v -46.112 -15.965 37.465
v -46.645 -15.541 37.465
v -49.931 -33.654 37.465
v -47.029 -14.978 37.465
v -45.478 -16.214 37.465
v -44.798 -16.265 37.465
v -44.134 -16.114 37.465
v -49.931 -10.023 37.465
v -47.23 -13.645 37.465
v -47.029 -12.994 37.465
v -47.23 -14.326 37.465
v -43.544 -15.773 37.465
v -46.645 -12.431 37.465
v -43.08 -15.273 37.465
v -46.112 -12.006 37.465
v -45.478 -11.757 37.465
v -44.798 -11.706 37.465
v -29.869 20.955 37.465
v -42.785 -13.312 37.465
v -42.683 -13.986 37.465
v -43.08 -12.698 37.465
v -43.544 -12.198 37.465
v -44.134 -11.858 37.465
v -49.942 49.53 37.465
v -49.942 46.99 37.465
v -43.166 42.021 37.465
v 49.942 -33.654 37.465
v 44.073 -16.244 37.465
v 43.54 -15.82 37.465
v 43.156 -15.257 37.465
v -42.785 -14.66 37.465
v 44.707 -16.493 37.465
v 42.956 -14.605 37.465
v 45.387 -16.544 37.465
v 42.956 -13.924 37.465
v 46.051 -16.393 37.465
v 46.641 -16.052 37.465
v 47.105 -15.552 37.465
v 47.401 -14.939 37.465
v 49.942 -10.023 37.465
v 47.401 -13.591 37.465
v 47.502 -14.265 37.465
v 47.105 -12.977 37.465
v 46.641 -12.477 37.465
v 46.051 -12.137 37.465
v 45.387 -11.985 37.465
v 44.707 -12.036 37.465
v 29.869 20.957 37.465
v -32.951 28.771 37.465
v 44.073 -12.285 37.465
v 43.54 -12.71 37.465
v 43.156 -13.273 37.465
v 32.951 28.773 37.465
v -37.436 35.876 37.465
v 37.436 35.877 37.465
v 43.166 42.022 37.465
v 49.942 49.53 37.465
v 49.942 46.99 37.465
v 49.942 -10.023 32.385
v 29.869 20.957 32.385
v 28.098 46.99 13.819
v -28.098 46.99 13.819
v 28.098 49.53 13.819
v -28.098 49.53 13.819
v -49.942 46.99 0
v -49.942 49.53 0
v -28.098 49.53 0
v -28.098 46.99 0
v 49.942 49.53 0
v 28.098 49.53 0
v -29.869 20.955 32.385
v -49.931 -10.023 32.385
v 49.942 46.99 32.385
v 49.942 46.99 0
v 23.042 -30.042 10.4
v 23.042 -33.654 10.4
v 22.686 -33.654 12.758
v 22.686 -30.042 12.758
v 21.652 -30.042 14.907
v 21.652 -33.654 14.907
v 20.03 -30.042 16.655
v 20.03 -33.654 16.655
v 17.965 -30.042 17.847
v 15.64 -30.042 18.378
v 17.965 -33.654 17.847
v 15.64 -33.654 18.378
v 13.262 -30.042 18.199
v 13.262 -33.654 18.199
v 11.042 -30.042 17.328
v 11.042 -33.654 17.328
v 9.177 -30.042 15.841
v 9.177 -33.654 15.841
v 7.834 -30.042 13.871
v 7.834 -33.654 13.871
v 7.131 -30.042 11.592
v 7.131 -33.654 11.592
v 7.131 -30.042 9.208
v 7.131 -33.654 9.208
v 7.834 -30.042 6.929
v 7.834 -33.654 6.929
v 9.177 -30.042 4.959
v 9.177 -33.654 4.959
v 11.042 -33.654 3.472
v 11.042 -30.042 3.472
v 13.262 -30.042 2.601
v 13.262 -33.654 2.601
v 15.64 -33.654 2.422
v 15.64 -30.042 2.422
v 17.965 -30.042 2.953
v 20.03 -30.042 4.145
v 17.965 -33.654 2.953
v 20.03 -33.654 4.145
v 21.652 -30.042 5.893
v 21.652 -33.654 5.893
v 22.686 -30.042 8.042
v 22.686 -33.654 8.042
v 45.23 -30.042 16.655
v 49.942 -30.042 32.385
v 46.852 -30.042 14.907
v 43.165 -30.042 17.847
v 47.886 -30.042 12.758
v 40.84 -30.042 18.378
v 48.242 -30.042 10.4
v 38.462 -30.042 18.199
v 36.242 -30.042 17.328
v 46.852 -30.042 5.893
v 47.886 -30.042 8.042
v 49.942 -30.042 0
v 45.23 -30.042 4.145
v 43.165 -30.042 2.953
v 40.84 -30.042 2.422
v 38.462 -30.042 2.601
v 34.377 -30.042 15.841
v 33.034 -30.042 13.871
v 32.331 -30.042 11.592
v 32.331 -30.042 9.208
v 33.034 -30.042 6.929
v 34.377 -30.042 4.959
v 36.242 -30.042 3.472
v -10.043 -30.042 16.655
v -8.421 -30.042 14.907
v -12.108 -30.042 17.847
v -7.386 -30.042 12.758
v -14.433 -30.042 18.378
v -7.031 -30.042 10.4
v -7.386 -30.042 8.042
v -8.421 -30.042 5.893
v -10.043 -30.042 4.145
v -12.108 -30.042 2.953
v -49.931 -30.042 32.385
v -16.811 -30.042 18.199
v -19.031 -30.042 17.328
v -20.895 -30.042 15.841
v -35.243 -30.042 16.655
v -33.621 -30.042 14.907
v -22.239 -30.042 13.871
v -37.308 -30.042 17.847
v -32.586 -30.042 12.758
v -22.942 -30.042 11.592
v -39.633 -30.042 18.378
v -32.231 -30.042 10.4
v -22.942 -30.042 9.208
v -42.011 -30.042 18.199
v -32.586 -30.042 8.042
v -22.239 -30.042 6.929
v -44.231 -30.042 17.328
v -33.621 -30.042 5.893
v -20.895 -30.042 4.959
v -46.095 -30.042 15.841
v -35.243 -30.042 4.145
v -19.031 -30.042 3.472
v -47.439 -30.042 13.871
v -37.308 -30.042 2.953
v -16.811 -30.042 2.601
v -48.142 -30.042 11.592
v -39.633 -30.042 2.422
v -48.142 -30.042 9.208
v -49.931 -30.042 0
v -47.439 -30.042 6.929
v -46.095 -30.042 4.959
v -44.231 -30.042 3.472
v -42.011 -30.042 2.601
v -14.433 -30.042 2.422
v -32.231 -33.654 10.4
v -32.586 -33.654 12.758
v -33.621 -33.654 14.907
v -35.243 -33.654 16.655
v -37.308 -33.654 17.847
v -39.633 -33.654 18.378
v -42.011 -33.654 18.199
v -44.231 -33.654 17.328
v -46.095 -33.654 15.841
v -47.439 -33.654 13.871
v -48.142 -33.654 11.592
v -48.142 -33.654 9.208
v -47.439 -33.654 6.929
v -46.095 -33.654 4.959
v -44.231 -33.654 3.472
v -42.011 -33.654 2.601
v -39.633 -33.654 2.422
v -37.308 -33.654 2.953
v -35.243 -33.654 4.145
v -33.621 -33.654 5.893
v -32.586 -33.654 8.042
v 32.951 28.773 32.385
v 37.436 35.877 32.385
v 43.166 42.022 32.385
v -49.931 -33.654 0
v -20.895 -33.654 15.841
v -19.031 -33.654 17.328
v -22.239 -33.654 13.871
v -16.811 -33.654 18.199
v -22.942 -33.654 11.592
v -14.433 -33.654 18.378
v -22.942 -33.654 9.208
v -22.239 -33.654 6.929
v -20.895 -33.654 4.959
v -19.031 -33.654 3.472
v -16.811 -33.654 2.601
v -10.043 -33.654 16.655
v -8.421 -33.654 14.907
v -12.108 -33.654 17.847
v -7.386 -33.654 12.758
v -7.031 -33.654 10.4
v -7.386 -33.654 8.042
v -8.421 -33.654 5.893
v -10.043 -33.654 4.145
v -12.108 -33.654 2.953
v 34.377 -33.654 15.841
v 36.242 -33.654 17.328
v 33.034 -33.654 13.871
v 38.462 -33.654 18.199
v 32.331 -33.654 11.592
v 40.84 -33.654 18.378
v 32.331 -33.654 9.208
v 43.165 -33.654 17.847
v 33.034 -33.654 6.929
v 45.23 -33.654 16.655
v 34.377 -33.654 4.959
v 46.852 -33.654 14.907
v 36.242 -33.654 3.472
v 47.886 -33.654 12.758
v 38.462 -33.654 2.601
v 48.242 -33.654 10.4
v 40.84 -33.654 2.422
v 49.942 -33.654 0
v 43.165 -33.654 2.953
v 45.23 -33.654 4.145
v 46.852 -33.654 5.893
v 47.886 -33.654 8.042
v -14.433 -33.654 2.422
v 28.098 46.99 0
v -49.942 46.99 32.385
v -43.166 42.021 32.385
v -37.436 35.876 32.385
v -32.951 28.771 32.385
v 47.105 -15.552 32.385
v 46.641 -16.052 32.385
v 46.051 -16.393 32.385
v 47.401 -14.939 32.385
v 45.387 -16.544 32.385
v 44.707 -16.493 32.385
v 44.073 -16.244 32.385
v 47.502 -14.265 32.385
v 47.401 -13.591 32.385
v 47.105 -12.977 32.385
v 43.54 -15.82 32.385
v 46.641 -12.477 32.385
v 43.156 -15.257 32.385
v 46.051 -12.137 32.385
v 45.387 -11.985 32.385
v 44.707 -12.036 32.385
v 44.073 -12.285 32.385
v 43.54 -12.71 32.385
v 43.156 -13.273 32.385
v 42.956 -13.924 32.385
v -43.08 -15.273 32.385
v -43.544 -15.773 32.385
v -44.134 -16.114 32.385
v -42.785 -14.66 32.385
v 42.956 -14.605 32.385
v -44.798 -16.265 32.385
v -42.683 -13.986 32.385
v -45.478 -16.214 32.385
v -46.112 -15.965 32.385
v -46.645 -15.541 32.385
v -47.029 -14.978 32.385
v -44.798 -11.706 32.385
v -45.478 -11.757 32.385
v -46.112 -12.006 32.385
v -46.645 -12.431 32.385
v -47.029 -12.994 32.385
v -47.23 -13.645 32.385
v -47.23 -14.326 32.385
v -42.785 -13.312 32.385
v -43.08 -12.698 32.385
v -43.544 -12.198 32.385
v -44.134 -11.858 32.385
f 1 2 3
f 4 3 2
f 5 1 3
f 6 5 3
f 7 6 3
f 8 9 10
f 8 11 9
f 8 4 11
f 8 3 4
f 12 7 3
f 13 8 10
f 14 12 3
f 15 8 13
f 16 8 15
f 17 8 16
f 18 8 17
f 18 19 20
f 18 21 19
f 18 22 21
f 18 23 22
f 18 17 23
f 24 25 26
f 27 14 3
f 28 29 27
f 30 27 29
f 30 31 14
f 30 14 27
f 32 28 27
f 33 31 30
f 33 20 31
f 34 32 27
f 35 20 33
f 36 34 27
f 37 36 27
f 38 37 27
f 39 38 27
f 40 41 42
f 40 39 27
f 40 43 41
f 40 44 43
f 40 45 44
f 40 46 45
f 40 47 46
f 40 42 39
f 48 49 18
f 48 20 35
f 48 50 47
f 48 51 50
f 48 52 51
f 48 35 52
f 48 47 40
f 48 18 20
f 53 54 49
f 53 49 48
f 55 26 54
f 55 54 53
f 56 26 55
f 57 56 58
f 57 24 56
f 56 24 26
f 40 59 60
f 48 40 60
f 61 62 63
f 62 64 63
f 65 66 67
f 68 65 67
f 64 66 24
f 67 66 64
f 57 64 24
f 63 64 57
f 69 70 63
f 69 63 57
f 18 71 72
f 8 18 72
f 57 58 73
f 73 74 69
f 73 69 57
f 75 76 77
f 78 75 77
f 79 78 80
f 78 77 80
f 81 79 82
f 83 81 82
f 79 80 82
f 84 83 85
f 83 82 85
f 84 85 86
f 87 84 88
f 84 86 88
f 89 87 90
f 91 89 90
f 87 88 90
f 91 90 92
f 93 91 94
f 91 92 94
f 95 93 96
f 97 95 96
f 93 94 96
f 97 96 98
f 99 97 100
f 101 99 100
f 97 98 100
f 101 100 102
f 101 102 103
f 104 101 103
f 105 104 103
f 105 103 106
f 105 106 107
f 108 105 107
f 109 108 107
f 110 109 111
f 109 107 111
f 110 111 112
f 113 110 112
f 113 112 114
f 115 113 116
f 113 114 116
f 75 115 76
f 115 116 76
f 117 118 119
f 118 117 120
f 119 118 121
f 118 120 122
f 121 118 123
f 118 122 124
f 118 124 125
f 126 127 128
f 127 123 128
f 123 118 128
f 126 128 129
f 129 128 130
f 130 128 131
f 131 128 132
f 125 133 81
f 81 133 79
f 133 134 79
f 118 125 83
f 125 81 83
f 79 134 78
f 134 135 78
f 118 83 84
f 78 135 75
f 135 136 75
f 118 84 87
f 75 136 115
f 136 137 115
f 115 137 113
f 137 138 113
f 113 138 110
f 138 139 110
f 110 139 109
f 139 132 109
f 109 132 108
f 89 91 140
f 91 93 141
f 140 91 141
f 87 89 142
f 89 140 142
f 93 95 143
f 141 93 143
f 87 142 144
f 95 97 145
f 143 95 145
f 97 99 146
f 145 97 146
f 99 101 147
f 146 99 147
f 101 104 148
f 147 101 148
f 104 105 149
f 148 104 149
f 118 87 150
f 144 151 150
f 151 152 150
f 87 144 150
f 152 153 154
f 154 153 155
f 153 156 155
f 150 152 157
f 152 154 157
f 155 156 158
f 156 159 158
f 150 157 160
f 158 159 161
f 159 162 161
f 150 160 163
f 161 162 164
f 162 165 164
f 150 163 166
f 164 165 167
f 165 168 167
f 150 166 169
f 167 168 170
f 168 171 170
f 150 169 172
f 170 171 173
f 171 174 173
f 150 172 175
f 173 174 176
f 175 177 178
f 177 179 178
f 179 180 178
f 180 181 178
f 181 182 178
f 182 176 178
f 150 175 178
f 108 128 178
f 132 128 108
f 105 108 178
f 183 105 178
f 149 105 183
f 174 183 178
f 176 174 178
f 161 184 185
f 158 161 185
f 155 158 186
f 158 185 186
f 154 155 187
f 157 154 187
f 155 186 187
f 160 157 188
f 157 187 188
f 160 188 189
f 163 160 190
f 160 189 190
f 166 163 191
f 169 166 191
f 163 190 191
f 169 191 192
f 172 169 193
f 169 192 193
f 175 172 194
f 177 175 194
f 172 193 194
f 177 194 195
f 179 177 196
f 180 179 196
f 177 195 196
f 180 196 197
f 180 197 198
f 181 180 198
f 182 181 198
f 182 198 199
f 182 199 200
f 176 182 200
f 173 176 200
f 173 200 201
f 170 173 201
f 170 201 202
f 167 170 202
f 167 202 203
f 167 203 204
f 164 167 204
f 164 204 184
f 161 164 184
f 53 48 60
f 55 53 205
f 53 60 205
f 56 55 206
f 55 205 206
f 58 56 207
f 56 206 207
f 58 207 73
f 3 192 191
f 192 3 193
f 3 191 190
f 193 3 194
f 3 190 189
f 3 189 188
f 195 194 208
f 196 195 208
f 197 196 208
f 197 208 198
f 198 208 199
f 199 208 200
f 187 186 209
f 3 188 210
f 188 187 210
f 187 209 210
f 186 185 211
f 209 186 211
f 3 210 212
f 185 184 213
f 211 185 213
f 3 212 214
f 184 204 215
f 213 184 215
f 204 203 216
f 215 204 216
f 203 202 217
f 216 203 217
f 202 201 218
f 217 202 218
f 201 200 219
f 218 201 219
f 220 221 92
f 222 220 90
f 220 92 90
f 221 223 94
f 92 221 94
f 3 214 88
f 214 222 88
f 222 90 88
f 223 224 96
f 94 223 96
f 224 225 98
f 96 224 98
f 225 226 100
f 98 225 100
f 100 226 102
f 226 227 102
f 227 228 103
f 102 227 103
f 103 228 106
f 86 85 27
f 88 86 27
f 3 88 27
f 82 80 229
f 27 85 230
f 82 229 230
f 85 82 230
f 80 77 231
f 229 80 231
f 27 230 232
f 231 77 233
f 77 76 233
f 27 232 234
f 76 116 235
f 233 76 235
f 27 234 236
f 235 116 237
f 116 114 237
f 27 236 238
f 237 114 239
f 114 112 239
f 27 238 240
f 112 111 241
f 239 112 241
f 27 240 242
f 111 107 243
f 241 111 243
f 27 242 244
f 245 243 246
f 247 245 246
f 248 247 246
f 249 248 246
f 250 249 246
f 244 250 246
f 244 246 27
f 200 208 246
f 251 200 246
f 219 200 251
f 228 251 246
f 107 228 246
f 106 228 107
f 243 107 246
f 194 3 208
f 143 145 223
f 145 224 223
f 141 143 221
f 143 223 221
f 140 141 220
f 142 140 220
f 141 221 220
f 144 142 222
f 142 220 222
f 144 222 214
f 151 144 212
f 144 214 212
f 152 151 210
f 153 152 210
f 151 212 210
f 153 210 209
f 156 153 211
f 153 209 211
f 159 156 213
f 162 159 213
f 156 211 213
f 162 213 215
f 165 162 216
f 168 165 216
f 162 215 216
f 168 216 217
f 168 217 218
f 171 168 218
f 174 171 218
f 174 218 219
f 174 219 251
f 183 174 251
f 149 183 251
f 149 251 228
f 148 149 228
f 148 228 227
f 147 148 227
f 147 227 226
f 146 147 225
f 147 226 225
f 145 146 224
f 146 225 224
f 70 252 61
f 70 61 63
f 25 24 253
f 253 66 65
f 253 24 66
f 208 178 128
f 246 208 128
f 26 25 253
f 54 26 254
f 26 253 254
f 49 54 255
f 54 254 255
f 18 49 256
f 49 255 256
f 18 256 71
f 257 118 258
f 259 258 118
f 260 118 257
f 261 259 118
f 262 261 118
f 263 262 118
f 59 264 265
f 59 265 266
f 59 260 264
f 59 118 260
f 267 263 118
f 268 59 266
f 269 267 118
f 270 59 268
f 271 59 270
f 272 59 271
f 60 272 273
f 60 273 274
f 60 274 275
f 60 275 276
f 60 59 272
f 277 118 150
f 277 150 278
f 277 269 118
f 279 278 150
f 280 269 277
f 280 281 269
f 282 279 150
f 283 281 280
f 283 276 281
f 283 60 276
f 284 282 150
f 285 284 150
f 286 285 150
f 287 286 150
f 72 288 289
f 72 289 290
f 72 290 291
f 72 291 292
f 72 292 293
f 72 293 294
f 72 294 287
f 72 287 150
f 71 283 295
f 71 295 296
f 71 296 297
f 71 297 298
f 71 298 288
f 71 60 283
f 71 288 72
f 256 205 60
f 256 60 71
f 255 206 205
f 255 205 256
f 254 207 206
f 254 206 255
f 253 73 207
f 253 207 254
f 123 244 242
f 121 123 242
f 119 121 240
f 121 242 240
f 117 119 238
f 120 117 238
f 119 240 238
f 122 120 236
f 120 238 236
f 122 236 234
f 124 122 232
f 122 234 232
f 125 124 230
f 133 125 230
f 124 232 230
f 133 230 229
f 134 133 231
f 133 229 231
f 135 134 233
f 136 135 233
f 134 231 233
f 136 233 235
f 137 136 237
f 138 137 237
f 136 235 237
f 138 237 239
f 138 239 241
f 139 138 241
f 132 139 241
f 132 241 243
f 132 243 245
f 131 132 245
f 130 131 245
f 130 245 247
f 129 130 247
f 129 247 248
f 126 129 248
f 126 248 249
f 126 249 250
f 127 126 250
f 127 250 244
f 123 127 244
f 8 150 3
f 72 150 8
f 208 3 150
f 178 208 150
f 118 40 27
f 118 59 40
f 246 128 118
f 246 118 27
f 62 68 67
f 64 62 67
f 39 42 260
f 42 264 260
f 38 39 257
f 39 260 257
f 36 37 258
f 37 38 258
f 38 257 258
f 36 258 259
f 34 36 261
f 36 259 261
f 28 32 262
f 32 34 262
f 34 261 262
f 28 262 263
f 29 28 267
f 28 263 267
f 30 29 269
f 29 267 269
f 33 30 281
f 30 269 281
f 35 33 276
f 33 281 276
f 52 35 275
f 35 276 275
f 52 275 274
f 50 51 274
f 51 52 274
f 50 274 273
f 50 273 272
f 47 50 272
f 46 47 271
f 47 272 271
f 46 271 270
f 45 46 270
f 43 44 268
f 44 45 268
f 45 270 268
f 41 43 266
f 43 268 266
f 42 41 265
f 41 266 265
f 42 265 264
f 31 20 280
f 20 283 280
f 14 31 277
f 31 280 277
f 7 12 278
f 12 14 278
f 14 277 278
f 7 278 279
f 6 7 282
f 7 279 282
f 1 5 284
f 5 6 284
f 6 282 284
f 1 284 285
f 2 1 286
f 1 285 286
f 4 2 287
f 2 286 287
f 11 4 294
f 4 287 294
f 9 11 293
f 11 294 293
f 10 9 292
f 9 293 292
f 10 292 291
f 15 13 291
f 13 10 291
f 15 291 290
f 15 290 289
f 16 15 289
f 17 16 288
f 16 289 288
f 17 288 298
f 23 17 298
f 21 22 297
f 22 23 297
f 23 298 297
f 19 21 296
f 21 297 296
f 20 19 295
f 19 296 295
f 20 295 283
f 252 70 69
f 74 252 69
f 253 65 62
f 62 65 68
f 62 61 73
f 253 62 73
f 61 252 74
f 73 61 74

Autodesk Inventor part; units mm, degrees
ref_plane "YZ Plane" through (0, 0, 0) normal (1, 0, 0) x (0, 1, 0)
ref_plane "XZ Plane" through (0, 0, 0) normal (0, 1, 0) x (-1, 0, 0)
ref_plane "XY Plane" through (0, 0, 0) normal (0, 0, 1) x (1, 0, 0)
sketch "Sketch1" plane through (0, 0, 0) normal (0, 0, 1) x (1, 0, 0)
  line L0 (-28.0978, -20.8895) -> (-28.0978, -10.0232) projected
  line L1 (-49.931, -10.0232) -> (-28.0978, -10.0232) projected
  line L2 (-49.931, -33.6545) -> (-49.931, -10.0232) projected
  line L3 (49.9418, -33.6545) -> (-49.931, -33.6545) projected
  line L4 (49.9418, -10.0232) -> (49.9418, -33.6545) projected
  line L5 (28.0978, -10.0232) -> (49.9418, -10.0232) projected
  line L6 (28.0978, -10.0232) -> (28.0978, 46.99) projected
  line L7 (25.2422, 49.53) -> (25.2422, -14.986) projected
  line L8 (25.2422, -14.986) -> (28.0978, -14.986) projected
  line L9 (28.0978, -14.986) -> (28.0978, -20.8895) projected
  line L10 (28.0978, -20.8895) -> (-28.0978, -20.8895) projected
  line L11 (-28.0978, -16.51) -> (-28.0978, 49.53) projected
  line L12 (-28.0978, 49.53) -> (25.2422, 49.53) projected
  line L13 (49.9418, -33.6545) -> (-49.931, -33.6545)
  line L14 (-49.931, -33.6545) -> (-49.931, -30.0416)
  line L15 (-49.931, -30.0416) -> (49.9418, -30.0416)
  line L16 (49.9418, -30.0416) -> (49.9418, -33.6545)
  line L17 (49.9418, 46.99) -> (49.9418, 49.53) projected
  line L18 (28.0978, 49.53) -> (49.9418, 49.53) projected
  line L19 (28.0978, 46.99) -> (28.0978, 49.53) projected
  line L20 (28.0978, 46.99) -> (49.9418, 46.99) projected
  line L21 (-49.9418, 49.53) -> (-49.9418, 46.99) projected
  line L22 (-49.9418, 46.99) -> (-28.0978, 46.99) projected
  line L23 (-28.0978, 46.99) -> (-28.0978, 49.53) projected
  line L24 (-49.9418, 49.53) -> (-28.0978, 49.53) projected
  line L25 (49.9418, 46.99) -> (28.0978, 46.99)
  line L26 (28.0978, 46.99) -> (28.0978, 49.53)
  line L27 (28.0978, 49.53) -> (49.9418, 49.53)
  line L28 (49.9418, 49.53) -> (49.9418, 46.99)
  line L29 (-28.0978, 46.99) -> (-49.9418, 46.99)
  line L30 (-49.9418, 46.99) -> (-49.9418, 49.53)
  line L31 (-49.9418, 49.53) -> (-28.0978, 49.53)
  line L32 (-28.0978, 49.53) -> (-28.0978, 46.99)
  line L33 (28.0978, 46.99) -> (49.9418, 46.99) projected
  line L34 (49.9418, 46.99) -> (49.9418, 49.53) projected
  line L35 (49.9418, 49.53) -> (25.2422, 49.53) projected
  circle A0 centre (-44.9691, -13.9857) radius 2.286 projected
  circle A1 centre (45.2161, -14.2647) radius 2.286 projected
  point P0 (0, 0)
extrude "Extrusion1" add sketch "Sketch1" along normal blind 25.4 contours L22 L21 L24 L11 | L15 L4 L3 L2 | L18 L17 L20 L19
sketch "Sketch2" plane through (-49.931, -33.6545, 0) normal (0, -1, 0) x (1, 0, 0)
  circle A0 centre (9.7, 10.4) radius 8 projected
  circle A1 centre (34.9, 10.4) radius 8 projected
  circle A2 centre (64.9728, 10.4) radius 8 projected
  circle A3 centre (90.1728, 10.4) radius 8 projected
  circle A4 centre (9.7, 10.4) radius 8.128
  circle A5 centre (34.9, 10.4) radius 8.128
  circle A6 centre (64.9728, 10.4) radius 8.128
  circle A7 centre (90.1728, 10.4) radius 8.128
  point P0 (49.931, 0)
  dimension "d2" = 16.256
  dimension "d3" = 16.256
  dimension "d4" = 16.256
  dimension "d5" = 16.256
extrude "Extrusion2" cut sketch "Sketch2" against normal blind 25.4 contours A0 | A1 | A2 | A3
sketch "Sketch3" plane through (0, 0, 25.4) normal (0, 0, 1) x (1, 0, 0)
  line L0 (-49.931, -33.6545) -> (49.9418, -33.6545) projected
  line L1 (49.9418, -33.6545) -> (-49.931, -33.6545)
  line L2 (-28.0978, -20.8895) -> (-28.0978, -10.0232) projected
  line L3 (-49.931, -10.0232) -> (-28.0978, -10.0232) projected
  line L4 (-49.931, -33.6545) -> (-49.931, -10.0232) projected
  line L5 (49.9418, -33.6545) -> (-49.931, -33.6545) projected
  line L6 (49.9418, -10.0232) -> (49.9418, -33.6545) projected
  line L7 (28.0978, -10.0232) -> (49.9418, -10.0232) projected
  line L8 (28.0978, -10.0232) -> (28.0978, 46.99) projected
  line L9 (28.0978, 46.99) -> (49.9418, 46.99) projected
  line L10 (49.9418, 46.99) -> (49.9418, 49.53) projected
  line L11 (49.9418, 49.53) -> (25.2422, 49.53) projected
  line L12 (25.2422, 49.53) -> (25.2422, -14.986) projected
  line L13 (25.2422, -14.986) -> (28.0978, -14.986) projected
  line L14 (28.0978, -14.986) -> (28.0978, -20.8895) projected
  line L15 (28.0978, -20.8895) -> (-28.0978, -20.8895) projected
  line L16 (-28.0978, -16.51) -> (-28.0978, 49.53) projected
  line L17 (-28.0978, 49.53) -> (25.2422, 49.53) projected
  line L18 (-28.0978, 46.99) -> (-28.0978, 49.53) projected
  line L19 (-28.0978, 49.53) -> (-49.9418, 49.53) projected
  line L20 (-49.9418, 49.53) -> (-49.9418, 46.99) projected
  line L21 (-49.9418, 46.99) -> (-28.0978, 46.99) projected
  line L22 (-49.9418, 49.53) -> (-49.9418, 46.99) projected
  line L23 (-49.9418, 46.99) -> (-49.9418, 49.53)
  line L24 (-49.9418, 49.53) -> (49.9418, 49.53)
  line L25 (49.9418, 49.53) -> (49.9418, 46.99)
  line L26 (49.9418, -30.0416) -> (-49.931, -30.0416) projected
  line L27 (-49.931, -33.6545) -> (-49.931, -30.0416)
  line L28 (49.9418, -33.6545) -> (49.9418, -30.0416)
  line L29 (49.9418, -30.0416) -> (-49.931, -30.0416) projected
  arc A0 (-49.931, -30.0416) -> (-49.9418, 46.99) centre (-72.9814, 8.471) ccw
  arc A1 (49.9418, 46.99) -> (49.9418, -30.0416) centre (72.9757, 8.4742) ccw
  point P0 (0, 0)
extrude "Extrusion3" add sketch "Sketch3" along normal blind 2.54
sketch "Sketch4" plane through (0, 0, 27.94) normal (0, 0, 1) x (1, 0, 0)
  line L0 (49.9418, -33.6545) -> (49.9418, -10.0232) projected
  line L1 (49.9418, -10.0232) -> (32.0871, -10.0232) projected
  arc A0 (49.9418, 46.99) -> (32.0871, -10.0232) centre (72.9757, 8.4742) ccw projected
  line L2 (49.9418, 46.99) -> (49.9418, 49.53) projected
  line L3 (49.9418, 49.53) -> (-49.9418, 49.53) projected
  line L4 (-49.9418, 49.53) -> (-49.9418, 46.99) projected
  arc A1 (-32.0851, -10.0232) -> (-49.9418, 46.99) centre (-72.9814, 8.471) ccw projected
  line L5 (-32.0851, -10.0232) -> (-49.931, -10.0232) projected
  line L6 (-49.931, -10.0232) -> (-49.931, -33.6545) projected
  line L7 (-49.931, -33.6545) -> (49.9418, -33.6545) projected
  line L8 (-46.121, -28.5371) -> (-46.121, -11.9877) projected
  line L9 (46.1318, -11.9877) -> (46.1318, -28.5371) projected
  line L10 (-28.0978, -16.51) -> (-28.0978, 49.53) projected
  line L11 (28.0978, -10.0232) -> (28.0978, 46.99) projected
  line L12 (-46.121, -28.5371) -> (46.1318, -28.5371)
  line L13 (46.1318, -28.5371) -> (46.1318, -11.9877)
  line L14 (46.1318, -11.9877) -> (-46.121, -11.9877)
  line L15 (-46.121, -11.9877) -> (-46.121, -28.5371)
  line L16 (-28.0978, -11.9877) -> (28.0978, -11.9877)
  line L17 (28.0978, -11.9877) -> (28.0978, -6.5147)
  line L18 (28.0978, -6.5147) -> (-28.0978, -6.5147)
  line L19 (-28.0978, -6.5147) -> (-28.0978, -11.9877)
  line L20 (-28.0978, 23.6896) -> (28.0978, 23.6896)
  line L21 (28.0978, 23.6896) -> (28.0978, 29.0198)
  line L22 (28.0978, 29.0198) -> (-28.0978, 29.0198)
  line L23 (-28.0978, 29.0198) -> (-28.0978, 23.6896)
  line L24 (-28.0978, 32.3759) -> (28.0978, 32.3759)
  line L25 (28.0978, 32.3759) -> (28.0978, 44.8129)
  line L26 (28.0978, 44.8129) -> (-28.0978, 44.8129)
  line L27 (-28.0978, 44.8129) -> (-28.0978, 32.3759)
  point P0 (0, 0)
extrude "Extrusion4" cut sketch "Sketch4" against normal blind 2.54 contours L11 L17 L14 L10 L18 | L20 L10 L22 L11 | L14 L9 L12 L8 | L24 L10 L26 L11
sketch "Sketch5" plane through (28.0978, 49.53, 0) normal (0, 1, 0) x (1, 0, 0)
  line L0 (0, -25.4) -> (21.844, -25.4) projected
  line L1 (-56.1955, 0) -> (-56.1955, -25.4) projected
  line L2 (0, -25.4) -> (-56.1955, -25.4)
  line L3 (-56.1955, -25.4) -> (-56.1955, -13.819)
  line L4 (-56.1955, -13.819) -> (0, -13.819)
  line L5 (0, -13.819) -> (0, -25.4)
  point P0 (-28.0978, 0)
extrude "Extrusion5" add sketch "Sketch5" against normal blind 2.54
sketch "Sketch6" plane through (0, 0, 27.94) normal (0, 0, 1) x (1, 0, 0)
  line L0 (46.1318, -28.5371) -> (-46.121, -28.5371) projected
  line L1 (-46.121, -11.9877) -> (-46.121, -28.5371) projected
  line L2 (28.0978, -10.0232) -> (49.9418, -10.0232) projected
  line L3 (28.0978, -11.9877) -> (46.1318, -11.9877) projected
  line L4 (28.0978, -6.5147) -> (28.0978, -11.9877) projected
  line L5 (46.1318, -28.5371) -> (46.1318, -11.9877) projected
  line L6 (46.1318, -28.5371) -> (46.1318, -11.9877) construction
  line L7 (46.1318, -11.9877) -> (28.0978, -11.9877) projected
  line L8 (46.1318, -11.9877) -> (28.0978, -11.9877) construction
  spline S0 degree 2 poles (46.1318, -28.5371) (46.1318, -11.9877) (28.0978, -11.9877) knots 1 1 1 2 2 2
  line L9 (-46.121, -28.5371) -> (-46.121, -11.9877)
  line L10 (-28.0978, -11.9877) -> (-46.121, -11.9877) projected
  line L11 (-46.121, -11.9877) -> (-28.0978, -11.9877)
  line L12 (46.1318, -28.5371) -> (46.1318, -11.9877)
  line L13 (46.1318, -11.9877) -> (28.0978, -11.9877)
  line L14 (-46.121, -11.9877) -> (-28.0978, -11.9877) projected
  line L15 (-28.0978, -11.9877) -> (-46.121, -11.9877)
  line L16 (-46.121, -11.9877) -> (-46.121, -28.5371)
  line L17 (-46.121, -28.5371) -> (-46.121, -11.9877) construction
  line L18 (-32.231, -33.6545) -> (-48.231, -33.6545) projected
  line L19 (-46.121, -11.9877) -> (-28.0978, -11.9877) construction
  spline S1 degree 2 poles (-46.121, -28.5371) (-46.121, -11.9877) (-28.0978, -11.9877) knots 1 1 1 2 2 2
  point P0 (0, 0)
extrude "Extrusion6" add sketch "Sketch6" against normal blind 2.54
sketch "Sketch7" plane through (0, 0, 27.94) normal (0, 0, 1) x (1, 0, 0)
  line L0 (-28.0978, -11.9877) -> (-28.0978, -6.5147) projected
  line L1 (-28.0978, -11.9877) -> (0, -6.5147)
  line L2 (0, -6.5147) -> (28.0978, -11.9877)
  line L3 (28.0978, -11.9877) -> (28.0978, -6.5147)
  line L4 (-28.0978, -6.5147) -> (28.0978, -6.5147) projected
  line L5 (28.0978, -6.5147) -> (-28.0978, -6.5147)
  line L6 (-28.0978, -6.5147) -> (-28.0978, -11.9877)
  line L7 (0, -6.5147) -> (28.0978, -11.9877)
  line L8 (-28.0978, -11.9877) -> (-46.121, -11.9877) projected
  line L9 (-28.0978, -11.9877) -> (0, -6.5147)
  line L10 (-28.0978, -11.9877) -> (0, -6.5147)
  line L11 (0, -6.5147) -> (-28.0978, -6.5147)
  line L12 (-28.0978, -6.5147) -> (-28.0978, -11.9877)
  line L13 (0, -6.5147) -> (28.0978, -6.5147)
  line L14 (28.0978, -6.5147) -> (28.0978, -11.9877)
  line L15 (28.0978, -11.9877) -> (0, -6.5147)
  point P0 (0, 0)
extrude "Extrusion7" add sketch "Sketch7" against normal blind 2.54
sketch "Sketch8" plane through (0, 0, 27.94) normal (0, 0, 1) x (1, 0, 0)
  line L0 (-32.0851, -10.0232) -> (-49.931, -10.0232) projected
  line L1 (28.0978, 23.6896) -> (-28.0978, 23.6896) projected
  line L2 (-49.931, -10.0232) -> (-28.0978, 23.6896)
  line L3 (-28.0978, 23.6896) -> (28.0978, 23.6896)
  line L4 (49.9418, -10.0232) -> (32.0871, -10.0232) projected
  line L5 (28.0978, 23.6896) -> (49.9418, -10.0232)
  line L6 (49.9418, -10.0232) -> (32.0871, -10.0232)
  line L7 (0, -6.5147) -> (-28.0978, -11.9877) projected
  line L8 (32.0871, -10.0232) -> (0, -6.5147)
  line L9 (28.0978, 44.8129) -> (28.0978, 32.3759) projected
  line L10 (28.0978, 32.3759) -> (-28.0978, 32.3759) projected
  line L11 (-28.0978, 32.3759) -> (-28.0978, 44.8129) projected
  line L12 (-28.0978, 44.8129) -> (28.0978, 44.8129) projected
  line L13 (28.0978, 29.0198) -> (28.0978, 23.6896) projected
  line L14 (28.0978, 23.6896) -> (-28.0978, 23.6896) projected
  line L15 (-28.0978, 23.6896) -> (-28.0978, 29.0198) projected
  line L16 (-28.0978, 29.0198) -> (28.0978, 29.0198) projected
  line L17 (46.1318, -28.5371) -> (-46.121, -28.5371) projected
  line L18 (-28.0978, -11.9877) -> (0, -6.5147) projected
  line L19 (0, -6.5147) -> (28.0978, -11.9877) projected
  line L20 (49.9418, -33.6545) -> (49.9418, -10.0232) projected
  line L21 (49.9418, -10.0232) -> (32.0871, -10.0232) projected
  arc A0 (49.9418, 46.99) -> (32.0871, -10.0232) centre (72.9757, 8.4742) ccw projected
  line L22 (49.9418, 46.99) -> (49.9418, 49.53) projected
  line L23 (49.9418, 49.53) -> (-49.9418, 49.53) projected
  line L24 (-49.9418, 49.53) -> (-49.9418, 46.99) projected
  arc A1 (-32.0851, -10.0232) -> (-49.9418, 46.99) centre (-72.9814, 8.471) ccw projected
  line L25 (-32.0851, -10.0232) -> (-49.931, -10.0232) projected
  line L26 (-49.931, -10.0232) -> (-49.931, -33.6545) projected
  line L27 (-49.931, -33.6545) -> (49.9418, -33.6545) projected
  line L28 (0, -6.5147) -> (-32.0851, -10.0232)
  line L29 (-49.931, -10.0232) -> (-32.0851, -10.0232)
  line L30 (-49.931, -10.0232) -> (-28.0978, 23.6896)
  line L31 (-28.0978, 29.0198) -> (-28.0978, 23.6896) projected
  line L32 (-28.0978, 23.6896) -> (28.0978, 23.6896)
  line L33 (28.0978, 23.6896) -> (49.9418, -10.0232)
  line L34 (49.9418, -30.0416) -> (49.9418, -10.0232) projected
  line L35 (49.9418, -10.0232) -> (32.0871, -10.0232)
  line L36 (32.0871, -10.0232) -> (0, -6.5147)
  line L37 (-32.0851, -10.0232) -> (-49.931, -10.0232)
  point P0 (0, 0)
extrude "Extrusion8" add sketch "Sketch8" against normal blind 2.54 contours L0 L2 A1 | A1 L2 L1 L5 A0 L8 L28 | A0 L5 L4
sketch "Sketch9" plane through (0, 0, 27.94) normal (0, 0, 1) x (1, 0, 0)
  line L0 (0, -6.5147) -> (-28.0978, -11.9877) projected
  line L1 (0, -6.5147) -> (28.0978, -11.9877) projected
  line L2 (-28.0978, -11.9877) -> (28.0978, -11.9877)
  line L3 (28.0978, -11.9877) -> (8.8321, -8.235)
  line L4 (28.0978, -11.9877) -> (0, -6.5147)
  line L5 (-28.0978, -11.9877) -> (0, -6.5147)
  point P0 (0, 0)
extrude "Extrusion9" add sketch "Sketch9" against normal blind 2.54
sketch "Sketch10" plane through (0, 0, 27.94) normal (0, 0, 1) x (1, 0, 0)
  line L0 (28.0978, -11.9877) -> (-28.0978, -11.9877) construction
  line L1 (-46.121, -28.5371) -> (-28.0978, -11.9877) construction
  line L2 (-49.931, -10.0232) -> (-49.931, -30.0416) construction
  line L3 (-28.0978, -11.9877) -> (-49.931, -10.0232) construction
  line L4 (-49.931, -10.0232) -> (-37.1094, -20.2624) construction
  line L5 (46.1318, -28.5371) -> (30.9358, -11.9877) construction
  line L6 (29.8686, 20.9566) -> (49.9418, -10.0232) construction
  line L7 (30.9358, -11.9877) -> (49.9418, -10.0232) construction
  line L8 (-29.8688, 20.9549) -> (-49.931, -10.0232) construction
  line L9 (-49.931, -10.0232) -> (-44.9691, -13.9857) construction
  line L10 (-49.931, -10.0232) -> (-43.581, -10.0232) construction
  line L11 (49.9418, -10.0232) -> (38.5338, -20.2624) construction
  line L12 (49.9418, -10.0232) -> (45.2161, -14.2647) construction
  line L13 (49.9418, -10.0232) -> (56.2918, -10.0232) construction
  circle A0 centre (-44.9691, -13.9857) radius 2.286
  circle A1 centre (45.2161, -14.2647) radius 2.286
  point P0 (0, 0)
  dimension "d22" = 6.35
  dimension "d23" = 38.61
  dimension "d24" = 6.35
  dimension "d25" = 138.09
  dimension "d26" = 4.572
  dimension "d27" = 4.572
extrude "Extrusion10" cut sketch "Sketch10" against normal blind 2.54
sketch "Sketch11" plane through (0, 0, 27.94) normal (0, 0, 1) x (1, 0, 0)
  circle A0 centre (-44.9691, -13.9857) radius 2.286 projected
  circle A1 centre (45.2161, -14.2647) radius 2.286 projected
  line L0 (46.1318, -28.5371) -> (-46.121, -28.5371) projected
  line L1 (-28.0978, -11.9877) -> (28.0978, -11.9877) projected
  line L2 (28.0978, 44.8129) -> (28.0978, 32.3759) projected
  line L3 (28.0978, 32.3759) -> (-28.0978, 32.3759) projected
  line L4 (-28.0978, 32.3759) -> (-28.0978, 44.8129) projected
  line L5 (-28.0978, 44.8129) -> (28.0978, 44.8129) projected
  line L6 (28.0978, 23.6896) -> (-28.0978, 23.6896) projected
  line L7 (-28.0978, 23.6896) -> (-28.0978, 29.0198) projected
  line L8 (-28.0978, 29.0198) -> (28.0978, 29.0198) projected
  line L9 (28.0978, 29.0198) -> (28.0978, 23.6896) projected
  arc A2 (49.9418, 46.99) -> (29.8686, 20.9566) centre (72.9757, 8.4742) ccw projected
  line L10 (49.9418, 46.99) -> (49.9418, 49.53) projected
  line L11 (49.9418, 49.53) -> (-49.9418, 49.53) projected
  line L12 (-49.9418, 49.53) -> (-49.9418, 46.99) projected
  arc A3 (-29.8688, 20.9549) -> (-49.9418, 46.99) centre (-72.9814, 8.471) ccw projected
  line L13 (-29.8688, 20.9549) -> (-49.931, -10.0232) projected
  line L14 (-49.931, -10.0232) -> (-49.931, -33.6545) projected
  line L15 (-49.931, -33.6545) -> (49.9418, -33.6545) projected
  line L16 (49.9418, -33.6545) -> (49.9418, -10.0232) projected
  line L17 (49.9418, -10.0232) -> (29.8686, 20.9566) projected
  line L18 (49.9418, -33.6545) -> (-49.931, -33.6545)
  line L19 (-49.931, -10.0232) -> (-49.931, -30.0416) projected
  line L20 (-49.931, -10.0232) -> (-29.8688, 20.9549)
  arc A4 (-29.8688, 20.9549) -> (-49.9418, 46.99) centre (-72.9814, 8.471) ccw
  line L21 (-49.9418, 46.99) -> (49.9418, 46.99) projected
  line L22 (-49.9418, 46.99) -> (-49.9418, 49.53)
  line L23 (49.9418, 49.53) -> (28.0978, 49.53) projected
  line L24 (-49.9418, 49.53) -> (49.9418, 49.53)
  line L25 (49.9418, 49.53) -> (49.9418, 46.99)
  line L26 (49.9418, -10.0232) -> (29.8686, 20.9566) projected
  arc A5 (49.9418, 46.99) -> (29.8686, 20.9566) centre (72.9757, 8.4742) ccw
  line L27 (29.8686, 20.9566) -> (49.9418, -10.0232)
  point P0 (0, 0)
extrude "Extrusion11" add sketch "Sketch11" along normal blind 9.525 contours L2 L3 L4 L5 | L6 L7 L8 L9 | L21 L12 L11 L10 | A2 L17 L16 L15 L14 L13 A3 L21
sketch "Sketch12" plane through (0, 0, 25.4) normal (0, 0, -1) x (-1, 0, 0)
  circle A0 centre (44.9691, -13.9857) radius 2.286 projected
  circle A1 centre (-45.2161, -14.2647) radius 2.286 projected
  line L0 (46.121, -28.5371) -> (-46.1318, -28.5371) projected
  line L1 (-28.0978, -11.9877) -> (28.0978, -11.9877) projected
  line L2 (-28.0978, 32.3759) -> (-28.0978, 44.8129) projected
  line L3 (-28.0978, 44.8129) -> (28.0978, 44.8129) projected
  line L4 (28.0978, 44.8129) -> (28.0978, 32.3759) projected
  line L5 (28.0978, 32.3759) -> (-28.0978, 32.3759) projected
  line L6 (28.0978, 23.6896) -> (-28.0978, 23.6896) projected
  line L7 (-28.0978, 23.6896) -> (-28.0978, 29.0198) projected
  line L8 (-28.0978, 29.0198) -> (28.0978, 29.0198) projected
  line L9 (28.0978, 29.0198) -> (28.0978, 23.6896) projected
  arc A2 (49.9418, 46.99) -> (29.8688, 20.9549) centre (72.9814, 8.471) ccw projected
  line L10 (49.9418, 46.99) -> (-49.9418, 46.99) projected
  arc A3 (-29.8686, 20.9566) -> (-49.9418, 46.99) centre (-72.9757, 8.4742) ccw projected
  line L11 (-29.8686, 20.9566) -> (-49.9418, -10.0232) projected
  line L12 (-49.9418, -30.0416) -> (-49.9418, -10.0232) projected
  line L13 (-49.9418, -30.0416) -> (49.931, -30.0416) projected
  line L14 (49.931, -10.0232) -> (49.931, -30.0416) projected
  line L15 (49.931, -10.0232) -> (29.8688, 20.9549) projected
  line L16 (49.931, -30.0416) -> (-49.9418, -30.0416)
  line L17 (-49.9418, -30.0416) -> (-49.9418, -10.0232) projected
  line L18 (-49.9418, -10.0232) -> (-29.8686, 20.9566)
  arc A4 (-29.8686, 20.9566) -> (-49.9418, 46.99) centre (-72.9757, 8.4742) ccw projected
  line L19 (49.931, -10.0232) -> (49.931, -30.0416)
  line L20 (49.931, -10.0232) -> (49.931, -33.6545) projected
  line L21 (29.8688, 20.9549) -> (49.931, -10.0232) projected
  line L22 (49.931, -10.0232) -> (29.8688, 20.9549)
  line L23 (49.9418, 46.99) -> (-49.9418, 46.99)
  line L24 (-49.9418, -10.0232) -> (-49.9418, -30.0416)
  line L25 (-28.0978, 46.99) -> (-49.9418, 46.99) projected
  arc A5 (-29.8686, 20.9566) -> (-49.9418, 46.99) centre (-72.9757, 8.4742) ccw
  arc A6 (49.9418, 46.99) -> (29.8688, 20.9549) centre (72.9814, 8.471) ccw
  point P0 (0, 0)
extrude "Extrusion12" cut sketch "Sketch12" against normal blind 6.985 contours L2 L3 L4 L5 | L6 L7 L8 L9 | A2 L15 L14 L13 L12 L11 A3 L10
properties part number "Chasis_top" material "PAEK Plastic"
